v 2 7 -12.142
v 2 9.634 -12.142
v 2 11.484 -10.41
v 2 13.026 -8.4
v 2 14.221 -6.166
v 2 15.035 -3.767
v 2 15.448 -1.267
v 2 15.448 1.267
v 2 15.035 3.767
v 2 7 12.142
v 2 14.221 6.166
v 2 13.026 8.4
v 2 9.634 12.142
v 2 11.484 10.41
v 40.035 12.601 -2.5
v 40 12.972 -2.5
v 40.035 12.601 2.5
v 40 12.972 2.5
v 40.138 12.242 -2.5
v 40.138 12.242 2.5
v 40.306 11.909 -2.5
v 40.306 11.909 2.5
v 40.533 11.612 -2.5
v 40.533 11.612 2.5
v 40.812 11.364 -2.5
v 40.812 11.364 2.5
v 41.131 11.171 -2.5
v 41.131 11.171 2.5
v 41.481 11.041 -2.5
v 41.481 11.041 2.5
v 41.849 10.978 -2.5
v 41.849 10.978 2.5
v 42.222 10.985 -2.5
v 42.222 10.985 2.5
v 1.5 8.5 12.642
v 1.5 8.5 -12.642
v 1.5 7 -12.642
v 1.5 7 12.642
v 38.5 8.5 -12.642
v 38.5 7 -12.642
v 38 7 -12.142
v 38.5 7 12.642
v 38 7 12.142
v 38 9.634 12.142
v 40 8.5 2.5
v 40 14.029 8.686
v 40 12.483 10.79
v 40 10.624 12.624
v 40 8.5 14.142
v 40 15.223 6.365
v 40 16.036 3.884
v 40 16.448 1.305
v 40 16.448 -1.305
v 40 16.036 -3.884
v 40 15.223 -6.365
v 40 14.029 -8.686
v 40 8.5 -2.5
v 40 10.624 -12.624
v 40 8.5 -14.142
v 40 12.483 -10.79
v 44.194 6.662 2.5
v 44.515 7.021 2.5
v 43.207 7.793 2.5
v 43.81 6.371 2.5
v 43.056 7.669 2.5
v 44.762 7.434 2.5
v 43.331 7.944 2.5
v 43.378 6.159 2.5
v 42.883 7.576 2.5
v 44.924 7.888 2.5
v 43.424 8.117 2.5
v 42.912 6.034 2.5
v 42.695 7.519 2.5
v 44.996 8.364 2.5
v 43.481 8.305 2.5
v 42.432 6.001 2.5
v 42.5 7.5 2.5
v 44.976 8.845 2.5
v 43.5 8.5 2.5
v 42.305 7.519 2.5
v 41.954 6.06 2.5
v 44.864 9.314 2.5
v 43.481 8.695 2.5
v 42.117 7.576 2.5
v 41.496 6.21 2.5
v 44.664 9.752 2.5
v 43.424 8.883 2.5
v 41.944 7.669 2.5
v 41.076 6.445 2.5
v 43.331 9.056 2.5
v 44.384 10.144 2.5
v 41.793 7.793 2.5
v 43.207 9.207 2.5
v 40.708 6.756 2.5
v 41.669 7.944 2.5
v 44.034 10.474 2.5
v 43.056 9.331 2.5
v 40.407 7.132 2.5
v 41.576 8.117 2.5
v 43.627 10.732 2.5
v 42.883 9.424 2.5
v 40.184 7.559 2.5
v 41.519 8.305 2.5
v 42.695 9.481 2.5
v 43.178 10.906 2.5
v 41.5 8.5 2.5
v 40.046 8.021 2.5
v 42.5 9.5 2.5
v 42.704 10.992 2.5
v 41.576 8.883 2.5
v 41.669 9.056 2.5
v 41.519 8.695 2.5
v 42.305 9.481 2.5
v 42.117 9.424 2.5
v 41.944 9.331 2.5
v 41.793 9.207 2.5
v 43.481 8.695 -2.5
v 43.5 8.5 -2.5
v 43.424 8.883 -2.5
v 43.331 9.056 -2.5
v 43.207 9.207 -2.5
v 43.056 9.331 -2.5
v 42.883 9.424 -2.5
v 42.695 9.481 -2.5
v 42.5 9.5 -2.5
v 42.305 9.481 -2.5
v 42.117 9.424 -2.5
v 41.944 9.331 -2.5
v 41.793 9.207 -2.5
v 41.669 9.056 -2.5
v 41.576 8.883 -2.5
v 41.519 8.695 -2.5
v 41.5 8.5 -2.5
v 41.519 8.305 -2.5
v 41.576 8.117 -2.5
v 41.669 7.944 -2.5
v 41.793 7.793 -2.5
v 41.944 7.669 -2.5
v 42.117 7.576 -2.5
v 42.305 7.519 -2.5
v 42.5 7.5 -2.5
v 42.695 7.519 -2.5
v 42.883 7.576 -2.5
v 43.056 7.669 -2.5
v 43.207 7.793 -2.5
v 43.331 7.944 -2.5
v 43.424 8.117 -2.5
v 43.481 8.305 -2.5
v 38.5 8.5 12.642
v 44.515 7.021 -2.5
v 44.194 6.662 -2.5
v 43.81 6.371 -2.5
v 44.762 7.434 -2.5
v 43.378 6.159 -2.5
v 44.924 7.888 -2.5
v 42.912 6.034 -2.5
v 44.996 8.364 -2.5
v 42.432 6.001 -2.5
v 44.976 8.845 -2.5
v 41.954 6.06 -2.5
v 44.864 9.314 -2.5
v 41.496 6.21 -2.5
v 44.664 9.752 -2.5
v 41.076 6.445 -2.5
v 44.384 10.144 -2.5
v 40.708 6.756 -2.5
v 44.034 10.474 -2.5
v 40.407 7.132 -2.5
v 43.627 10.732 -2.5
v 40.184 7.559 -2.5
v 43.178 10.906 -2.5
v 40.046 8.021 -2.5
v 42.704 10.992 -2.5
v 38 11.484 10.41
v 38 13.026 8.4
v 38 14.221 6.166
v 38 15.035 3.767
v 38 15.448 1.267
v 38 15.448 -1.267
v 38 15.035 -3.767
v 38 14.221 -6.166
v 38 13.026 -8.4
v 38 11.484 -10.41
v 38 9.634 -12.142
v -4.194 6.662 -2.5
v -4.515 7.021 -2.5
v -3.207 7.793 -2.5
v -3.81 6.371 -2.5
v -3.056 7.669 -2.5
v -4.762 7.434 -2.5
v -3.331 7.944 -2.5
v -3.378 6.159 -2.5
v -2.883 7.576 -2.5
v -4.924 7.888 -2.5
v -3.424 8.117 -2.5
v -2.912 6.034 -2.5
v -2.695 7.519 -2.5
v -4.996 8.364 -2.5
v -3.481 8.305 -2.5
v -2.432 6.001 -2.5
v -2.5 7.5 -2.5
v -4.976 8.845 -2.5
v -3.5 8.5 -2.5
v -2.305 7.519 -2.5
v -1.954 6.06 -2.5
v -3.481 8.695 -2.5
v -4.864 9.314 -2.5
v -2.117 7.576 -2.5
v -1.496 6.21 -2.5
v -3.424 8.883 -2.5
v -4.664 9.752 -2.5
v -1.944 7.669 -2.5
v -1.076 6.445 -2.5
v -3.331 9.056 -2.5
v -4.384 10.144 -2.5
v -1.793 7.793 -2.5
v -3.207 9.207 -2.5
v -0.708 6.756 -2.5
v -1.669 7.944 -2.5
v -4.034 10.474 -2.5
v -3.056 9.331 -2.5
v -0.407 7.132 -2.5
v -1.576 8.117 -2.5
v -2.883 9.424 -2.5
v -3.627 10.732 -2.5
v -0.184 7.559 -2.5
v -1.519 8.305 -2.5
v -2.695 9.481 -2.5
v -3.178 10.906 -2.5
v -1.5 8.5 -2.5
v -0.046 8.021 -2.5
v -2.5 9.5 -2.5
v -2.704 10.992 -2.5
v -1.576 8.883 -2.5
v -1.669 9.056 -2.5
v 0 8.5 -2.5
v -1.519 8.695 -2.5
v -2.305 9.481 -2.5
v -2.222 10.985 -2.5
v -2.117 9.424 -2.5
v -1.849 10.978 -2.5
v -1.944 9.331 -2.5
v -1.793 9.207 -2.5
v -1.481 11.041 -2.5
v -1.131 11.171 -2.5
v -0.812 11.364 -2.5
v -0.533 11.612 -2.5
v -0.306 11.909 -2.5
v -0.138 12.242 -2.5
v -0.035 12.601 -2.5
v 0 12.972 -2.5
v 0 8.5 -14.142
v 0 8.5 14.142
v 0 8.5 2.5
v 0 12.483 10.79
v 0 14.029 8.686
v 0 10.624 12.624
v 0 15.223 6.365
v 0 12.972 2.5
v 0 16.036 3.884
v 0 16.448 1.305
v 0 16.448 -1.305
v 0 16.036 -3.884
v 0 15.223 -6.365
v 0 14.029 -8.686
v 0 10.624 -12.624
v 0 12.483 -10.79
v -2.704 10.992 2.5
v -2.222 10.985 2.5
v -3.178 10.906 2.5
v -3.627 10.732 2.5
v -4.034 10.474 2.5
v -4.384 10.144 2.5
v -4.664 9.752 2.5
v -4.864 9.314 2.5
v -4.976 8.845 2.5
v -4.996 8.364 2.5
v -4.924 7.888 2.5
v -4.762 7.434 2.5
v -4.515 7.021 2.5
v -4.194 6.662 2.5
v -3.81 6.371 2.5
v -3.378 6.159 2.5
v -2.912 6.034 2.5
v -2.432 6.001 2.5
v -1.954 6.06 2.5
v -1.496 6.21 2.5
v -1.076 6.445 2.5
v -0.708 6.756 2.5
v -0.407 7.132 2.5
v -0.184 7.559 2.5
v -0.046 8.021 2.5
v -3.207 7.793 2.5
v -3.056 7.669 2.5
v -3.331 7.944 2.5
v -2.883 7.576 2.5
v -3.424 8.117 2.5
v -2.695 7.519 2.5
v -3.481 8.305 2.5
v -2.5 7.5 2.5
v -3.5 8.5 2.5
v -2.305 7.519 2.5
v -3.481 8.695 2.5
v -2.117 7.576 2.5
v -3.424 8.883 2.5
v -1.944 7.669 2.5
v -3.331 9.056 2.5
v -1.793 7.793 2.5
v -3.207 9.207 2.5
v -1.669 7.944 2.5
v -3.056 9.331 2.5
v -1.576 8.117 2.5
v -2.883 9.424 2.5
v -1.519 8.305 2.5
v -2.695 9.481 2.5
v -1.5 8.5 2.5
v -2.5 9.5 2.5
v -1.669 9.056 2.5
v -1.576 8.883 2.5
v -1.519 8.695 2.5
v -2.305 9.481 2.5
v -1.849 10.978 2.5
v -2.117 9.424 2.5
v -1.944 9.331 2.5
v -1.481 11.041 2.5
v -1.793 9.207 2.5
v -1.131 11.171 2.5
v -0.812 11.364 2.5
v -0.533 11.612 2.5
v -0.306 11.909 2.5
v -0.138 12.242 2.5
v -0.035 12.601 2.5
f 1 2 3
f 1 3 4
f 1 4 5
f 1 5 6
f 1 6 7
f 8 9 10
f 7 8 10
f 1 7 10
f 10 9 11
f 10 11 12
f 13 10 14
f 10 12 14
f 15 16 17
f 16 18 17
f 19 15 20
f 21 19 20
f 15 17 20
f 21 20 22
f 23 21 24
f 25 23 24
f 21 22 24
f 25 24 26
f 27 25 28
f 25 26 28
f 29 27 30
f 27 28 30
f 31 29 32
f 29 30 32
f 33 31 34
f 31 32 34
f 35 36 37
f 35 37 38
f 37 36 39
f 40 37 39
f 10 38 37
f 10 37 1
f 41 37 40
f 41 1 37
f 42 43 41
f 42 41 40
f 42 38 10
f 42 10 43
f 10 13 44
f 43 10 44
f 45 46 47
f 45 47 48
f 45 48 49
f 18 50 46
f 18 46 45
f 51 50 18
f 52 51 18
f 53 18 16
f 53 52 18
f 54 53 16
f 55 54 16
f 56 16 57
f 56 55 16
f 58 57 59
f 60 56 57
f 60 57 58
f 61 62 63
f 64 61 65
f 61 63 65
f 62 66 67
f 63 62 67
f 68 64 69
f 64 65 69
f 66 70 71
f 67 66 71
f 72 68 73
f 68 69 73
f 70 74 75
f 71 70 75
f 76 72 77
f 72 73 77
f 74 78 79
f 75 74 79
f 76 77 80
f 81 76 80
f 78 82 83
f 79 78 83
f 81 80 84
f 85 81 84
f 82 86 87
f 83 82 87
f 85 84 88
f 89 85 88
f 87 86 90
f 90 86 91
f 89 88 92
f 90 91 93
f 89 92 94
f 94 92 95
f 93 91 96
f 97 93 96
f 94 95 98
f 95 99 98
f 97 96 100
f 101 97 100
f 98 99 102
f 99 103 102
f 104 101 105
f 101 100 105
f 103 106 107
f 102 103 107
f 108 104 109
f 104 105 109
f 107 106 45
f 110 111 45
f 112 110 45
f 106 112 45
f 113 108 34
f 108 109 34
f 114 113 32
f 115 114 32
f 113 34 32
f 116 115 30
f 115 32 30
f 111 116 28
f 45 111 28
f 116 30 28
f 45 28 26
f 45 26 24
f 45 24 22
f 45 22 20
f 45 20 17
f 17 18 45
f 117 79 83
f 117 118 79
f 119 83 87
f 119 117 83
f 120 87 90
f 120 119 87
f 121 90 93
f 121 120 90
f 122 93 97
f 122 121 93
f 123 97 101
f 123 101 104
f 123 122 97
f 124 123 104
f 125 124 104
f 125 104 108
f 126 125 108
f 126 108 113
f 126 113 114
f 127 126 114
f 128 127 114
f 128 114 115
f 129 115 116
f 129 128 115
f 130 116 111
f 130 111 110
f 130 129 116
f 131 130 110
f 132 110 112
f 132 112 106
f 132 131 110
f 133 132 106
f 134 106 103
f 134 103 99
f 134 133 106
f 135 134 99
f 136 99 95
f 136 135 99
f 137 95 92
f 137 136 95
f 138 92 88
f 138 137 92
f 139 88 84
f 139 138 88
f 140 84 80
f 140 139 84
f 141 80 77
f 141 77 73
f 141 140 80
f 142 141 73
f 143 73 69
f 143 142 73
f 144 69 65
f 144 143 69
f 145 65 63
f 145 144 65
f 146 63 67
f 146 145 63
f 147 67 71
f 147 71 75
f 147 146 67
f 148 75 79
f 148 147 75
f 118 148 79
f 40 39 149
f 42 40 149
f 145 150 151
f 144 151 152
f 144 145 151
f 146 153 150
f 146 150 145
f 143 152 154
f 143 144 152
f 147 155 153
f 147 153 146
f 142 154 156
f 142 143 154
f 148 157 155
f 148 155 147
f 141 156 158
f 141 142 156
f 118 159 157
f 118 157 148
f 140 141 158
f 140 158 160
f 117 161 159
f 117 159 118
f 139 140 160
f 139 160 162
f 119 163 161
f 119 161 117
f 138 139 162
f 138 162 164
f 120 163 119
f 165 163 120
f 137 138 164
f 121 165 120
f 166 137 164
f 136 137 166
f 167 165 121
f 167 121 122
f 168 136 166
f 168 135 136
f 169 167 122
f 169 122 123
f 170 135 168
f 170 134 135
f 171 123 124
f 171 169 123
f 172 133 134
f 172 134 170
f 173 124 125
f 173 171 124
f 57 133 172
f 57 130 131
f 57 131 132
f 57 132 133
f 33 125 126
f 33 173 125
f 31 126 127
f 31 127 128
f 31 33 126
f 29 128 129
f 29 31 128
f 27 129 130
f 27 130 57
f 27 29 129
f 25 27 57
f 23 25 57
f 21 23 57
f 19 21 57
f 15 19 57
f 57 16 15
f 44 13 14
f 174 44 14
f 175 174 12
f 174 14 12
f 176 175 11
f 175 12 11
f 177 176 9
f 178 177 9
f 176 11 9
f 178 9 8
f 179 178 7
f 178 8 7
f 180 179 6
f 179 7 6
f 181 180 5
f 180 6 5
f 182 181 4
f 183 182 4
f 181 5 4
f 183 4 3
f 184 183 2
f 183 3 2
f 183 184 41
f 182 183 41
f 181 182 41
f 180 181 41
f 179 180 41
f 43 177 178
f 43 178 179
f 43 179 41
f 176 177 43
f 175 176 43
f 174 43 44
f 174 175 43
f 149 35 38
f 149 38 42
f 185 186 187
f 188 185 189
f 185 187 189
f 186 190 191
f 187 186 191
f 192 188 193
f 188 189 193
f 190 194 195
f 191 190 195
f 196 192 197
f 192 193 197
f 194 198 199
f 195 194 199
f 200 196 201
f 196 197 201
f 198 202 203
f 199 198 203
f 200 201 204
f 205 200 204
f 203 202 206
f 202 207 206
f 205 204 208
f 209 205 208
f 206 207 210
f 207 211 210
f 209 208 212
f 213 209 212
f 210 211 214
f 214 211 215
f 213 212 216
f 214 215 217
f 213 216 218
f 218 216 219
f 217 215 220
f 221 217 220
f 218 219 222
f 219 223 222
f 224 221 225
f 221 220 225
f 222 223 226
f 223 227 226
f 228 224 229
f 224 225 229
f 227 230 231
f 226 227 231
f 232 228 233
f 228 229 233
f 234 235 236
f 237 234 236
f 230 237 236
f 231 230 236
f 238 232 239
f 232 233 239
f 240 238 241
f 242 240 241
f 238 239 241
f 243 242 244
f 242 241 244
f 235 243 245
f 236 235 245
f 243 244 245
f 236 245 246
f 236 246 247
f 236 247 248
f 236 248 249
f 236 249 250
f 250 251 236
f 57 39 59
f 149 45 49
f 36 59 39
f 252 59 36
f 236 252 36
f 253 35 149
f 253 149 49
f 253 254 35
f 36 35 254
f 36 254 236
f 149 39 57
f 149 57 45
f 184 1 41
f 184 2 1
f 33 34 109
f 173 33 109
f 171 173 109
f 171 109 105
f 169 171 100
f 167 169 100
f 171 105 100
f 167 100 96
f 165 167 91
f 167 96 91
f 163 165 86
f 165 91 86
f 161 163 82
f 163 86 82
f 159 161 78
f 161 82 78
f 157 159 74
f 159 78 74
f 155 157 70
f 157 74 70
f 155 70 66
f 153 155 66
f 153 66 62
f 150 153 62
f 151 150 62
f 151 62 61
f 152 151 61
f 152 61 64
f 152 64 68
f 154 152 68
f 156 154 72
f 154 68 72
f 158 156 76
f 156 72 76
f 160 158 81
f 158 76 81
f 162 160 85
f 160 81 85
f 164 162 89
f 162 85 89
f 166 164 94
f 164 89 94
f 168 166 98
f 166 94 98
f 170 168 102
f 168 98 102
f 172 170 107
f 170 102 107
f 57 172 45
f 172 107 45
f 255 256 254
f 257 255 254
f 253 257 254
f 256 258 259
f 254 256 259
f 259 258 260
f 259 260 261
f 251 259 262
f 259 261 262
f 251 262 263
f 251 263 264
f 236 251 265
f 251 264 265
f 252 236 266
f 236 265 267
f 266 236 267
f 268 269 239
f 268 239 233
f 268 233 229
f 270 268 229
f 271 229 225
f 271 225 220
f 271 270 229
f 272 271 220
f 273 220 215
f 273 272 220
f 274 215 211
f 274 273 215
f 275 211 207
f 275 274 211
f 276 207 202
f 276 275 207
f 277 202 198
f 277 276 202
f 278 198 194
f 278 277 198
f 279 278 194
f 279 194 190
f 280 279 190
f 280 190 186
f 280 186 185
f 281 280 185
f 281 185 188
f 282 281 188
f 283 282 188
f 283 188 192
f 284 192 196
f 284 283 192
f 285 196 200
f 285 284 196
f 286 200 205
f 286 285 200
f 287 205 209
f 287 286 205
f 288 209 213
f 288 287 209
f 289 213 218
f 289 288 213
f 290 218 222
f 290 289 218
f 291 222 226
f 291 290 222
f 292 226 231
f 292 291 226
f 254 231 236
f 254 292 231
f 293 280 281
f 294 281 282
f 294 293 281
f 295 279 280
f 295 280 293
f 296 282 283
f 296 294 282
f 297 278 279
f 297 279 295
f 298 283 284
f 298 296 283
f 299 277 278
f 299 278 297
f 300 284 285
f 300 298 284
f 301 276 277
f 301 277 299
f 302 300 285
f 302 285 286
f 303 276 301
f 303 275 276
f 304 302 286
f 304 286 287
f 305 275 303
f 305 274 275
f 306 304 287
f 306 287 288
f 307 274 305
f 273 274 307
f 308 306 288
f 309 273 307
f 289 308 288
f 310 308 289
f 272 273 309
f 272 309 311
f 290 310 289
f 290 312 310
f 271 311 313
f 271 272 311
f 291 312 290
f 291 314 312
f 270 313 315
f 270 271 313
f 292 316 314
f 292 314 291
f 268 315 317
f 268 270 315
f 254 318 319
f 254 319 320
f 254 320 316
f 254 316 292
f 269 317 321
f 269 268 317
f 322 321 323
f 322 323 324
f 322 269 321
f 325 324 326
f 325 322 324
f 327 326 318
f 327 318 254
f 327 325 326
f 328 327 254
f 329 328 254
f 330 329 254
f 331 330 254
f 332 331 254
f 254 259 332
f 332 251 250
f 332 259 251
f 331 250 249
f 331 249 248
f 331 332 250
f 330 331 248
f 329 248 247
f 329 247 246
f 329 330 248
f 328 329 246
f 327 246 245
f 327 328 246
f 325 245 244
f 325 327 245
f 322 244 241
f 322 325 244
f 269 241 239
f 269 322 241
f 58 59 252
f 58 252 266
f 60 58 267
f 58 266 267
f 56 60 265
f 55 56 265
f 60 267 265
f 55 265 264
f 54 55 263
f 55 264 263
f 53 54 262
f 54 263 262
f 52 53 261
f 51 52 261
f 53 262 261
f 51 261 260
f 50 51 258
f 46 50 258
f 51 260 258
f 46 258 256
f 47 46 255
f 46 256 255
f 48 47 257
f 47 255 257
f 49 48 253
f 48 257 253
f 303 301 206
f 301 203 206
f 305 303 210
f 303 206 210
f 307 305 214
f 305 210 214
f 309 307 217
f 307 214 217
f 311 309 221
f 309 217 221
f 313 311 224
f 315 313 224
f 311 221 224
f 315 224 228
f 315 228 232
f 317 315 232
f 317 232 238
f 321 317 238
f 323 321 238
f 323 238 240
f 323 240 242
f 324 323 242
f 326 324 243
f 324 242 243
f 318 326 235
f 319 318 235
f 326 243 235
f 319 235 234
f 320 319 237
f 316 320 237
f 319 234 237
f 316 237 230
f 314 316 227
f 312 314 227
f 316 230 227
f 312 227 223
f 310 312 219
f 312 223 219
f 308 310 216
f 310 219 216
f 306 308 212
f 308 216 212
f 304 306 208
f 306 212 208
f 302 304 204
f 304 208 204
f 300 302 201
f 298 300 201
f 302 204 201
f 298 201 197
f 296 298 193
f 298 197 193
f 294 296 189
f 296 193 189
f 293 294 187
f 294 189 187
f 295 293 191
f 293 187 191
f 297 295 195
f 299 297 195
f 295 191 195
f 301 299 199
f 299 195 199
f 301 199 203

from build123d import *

# Parameters (mm, degrees)
SKETCH2_R               = 16.5
BOSS_EXTRUDE1_DEPTH     = 40
SKETCH3_W               = 33
SKETCH3_H               = 25
CUT_EXTRUDE1_DEPTH      = 40
CUT_EXTRUDE2_REACH      = 45.174
CUT_EXTRUDE2_END_RADIUS = 15.5
SKETCH4_W               = 36
SKETCH4_H               = 24.284271248
SKETCH5_W               = 37
SKETCH5_H               = 25.284271248
SKETCH5_W_2             = 36
SKETCH5_H_2             = 24.284271248
BOSS_EXTRUDE2_DEPTH     = 1.5
SKETCH7_R               = 1
BOSS_EXTRUDE3_DEPTH     = 2.5


with BuildPart() as part:
    # Sketch2 → Boss-Extrude1 (new body)
    with BuildSketch(Plane(origin=(0, 0, 0), x_dir=(0, 0, -1), z_dir=(1, 0, 0))):
        Circle(SKETCH2_R)
    extrude(amount=BOSS_EXTRUDE1_DEPTH)

    # Sketch3 → Cut-Extrude1 (cut)
    with BuildSketch(Plane.ZY):
        with Locations((0, -4)):
            Rectangle(SKETCH3_W, SKETCH3_H)
    extrude(amount=-CUT_EXTRUDE1_DEPTH, mode=Mode.SUBTRACT)

    # Cut-Extrude2: up to this cylinder (the profile starts inside it)
    cut_extrude2_end = Plane(origin=(20, 0, 0), z_dir=(-1, 0, 0)) * Cylinder(CUT_EXTRUDE2_END_RADIUS, 122.348, mode=Mode.PRIVATE)
    # Sketch4 → Cut-Extrude2 (cut, up to the surface)
    with BuildSketch(Plane.XZ.offset(-8.5), mode=Mode.PRIVATE) as cut_extrude2_sk1:
        with Locations((20, 0)):
            Rectangle(SKETCH4_W, SKETCH4_H)
    cut_extrude2_tool1 = extrude(cut_extrude2_sk1.sketch, amount=-CUT_EXTRUDE2_REACH, mode=Mode.PRIVATE) & cut_extrude2_end
    add(cut_extrude2_tool1.solids().sort_by_distance((20, 8.5, 0))[0], mode=Mode.SUBTRACT)

    # Sketch5 → Boss-Extrude2 (add)
    with BuildSketch(Plane.XZ.offset(-8.5)):
        with Locations((20, 0)):
            Rectangle(SKETCH5_W, SKETCH5_H)
        with Locations((20, 0)):
            Rectangle(SKETCH5_W_2, SKETCH5_H_2, mode=Mode.SUBTRACT)
    extrude(amount=BOSS_EXTRUDE2_DEPTH)

    # Sketch7 → Boss-Extrude3 (add, symmetric)
    with BuildSketch(Plane.XY):
        with BuildLine():
            Line((40, 8.5), (40, 12.972135955))
            ThreePointArc((40, 12.972135955), (40.666666667, 11.48142397), (42.222222222, 10.984519975))
            ThreePointArc((42.222222222, 10.984519975), (44.363389981, 6.833333333), (40, 8.5))
        make_face()
        with Locations((42.5, 8.5)):
            Circle(SKETCH7_R, mode=Mode.SUBTRACT)
    boss_extrude3 = extrude(amount=BOSS_EXTRUDE3_DEPTH, both=True)

    # Mirror2: Boss-Extrude3 across plane
    add(boss_extrude3.mirror(Plane(origin=(20, 0, 0), x_dir=(0, 0, 1), z_dir=(1, 0, 0))))


solid = part.part
